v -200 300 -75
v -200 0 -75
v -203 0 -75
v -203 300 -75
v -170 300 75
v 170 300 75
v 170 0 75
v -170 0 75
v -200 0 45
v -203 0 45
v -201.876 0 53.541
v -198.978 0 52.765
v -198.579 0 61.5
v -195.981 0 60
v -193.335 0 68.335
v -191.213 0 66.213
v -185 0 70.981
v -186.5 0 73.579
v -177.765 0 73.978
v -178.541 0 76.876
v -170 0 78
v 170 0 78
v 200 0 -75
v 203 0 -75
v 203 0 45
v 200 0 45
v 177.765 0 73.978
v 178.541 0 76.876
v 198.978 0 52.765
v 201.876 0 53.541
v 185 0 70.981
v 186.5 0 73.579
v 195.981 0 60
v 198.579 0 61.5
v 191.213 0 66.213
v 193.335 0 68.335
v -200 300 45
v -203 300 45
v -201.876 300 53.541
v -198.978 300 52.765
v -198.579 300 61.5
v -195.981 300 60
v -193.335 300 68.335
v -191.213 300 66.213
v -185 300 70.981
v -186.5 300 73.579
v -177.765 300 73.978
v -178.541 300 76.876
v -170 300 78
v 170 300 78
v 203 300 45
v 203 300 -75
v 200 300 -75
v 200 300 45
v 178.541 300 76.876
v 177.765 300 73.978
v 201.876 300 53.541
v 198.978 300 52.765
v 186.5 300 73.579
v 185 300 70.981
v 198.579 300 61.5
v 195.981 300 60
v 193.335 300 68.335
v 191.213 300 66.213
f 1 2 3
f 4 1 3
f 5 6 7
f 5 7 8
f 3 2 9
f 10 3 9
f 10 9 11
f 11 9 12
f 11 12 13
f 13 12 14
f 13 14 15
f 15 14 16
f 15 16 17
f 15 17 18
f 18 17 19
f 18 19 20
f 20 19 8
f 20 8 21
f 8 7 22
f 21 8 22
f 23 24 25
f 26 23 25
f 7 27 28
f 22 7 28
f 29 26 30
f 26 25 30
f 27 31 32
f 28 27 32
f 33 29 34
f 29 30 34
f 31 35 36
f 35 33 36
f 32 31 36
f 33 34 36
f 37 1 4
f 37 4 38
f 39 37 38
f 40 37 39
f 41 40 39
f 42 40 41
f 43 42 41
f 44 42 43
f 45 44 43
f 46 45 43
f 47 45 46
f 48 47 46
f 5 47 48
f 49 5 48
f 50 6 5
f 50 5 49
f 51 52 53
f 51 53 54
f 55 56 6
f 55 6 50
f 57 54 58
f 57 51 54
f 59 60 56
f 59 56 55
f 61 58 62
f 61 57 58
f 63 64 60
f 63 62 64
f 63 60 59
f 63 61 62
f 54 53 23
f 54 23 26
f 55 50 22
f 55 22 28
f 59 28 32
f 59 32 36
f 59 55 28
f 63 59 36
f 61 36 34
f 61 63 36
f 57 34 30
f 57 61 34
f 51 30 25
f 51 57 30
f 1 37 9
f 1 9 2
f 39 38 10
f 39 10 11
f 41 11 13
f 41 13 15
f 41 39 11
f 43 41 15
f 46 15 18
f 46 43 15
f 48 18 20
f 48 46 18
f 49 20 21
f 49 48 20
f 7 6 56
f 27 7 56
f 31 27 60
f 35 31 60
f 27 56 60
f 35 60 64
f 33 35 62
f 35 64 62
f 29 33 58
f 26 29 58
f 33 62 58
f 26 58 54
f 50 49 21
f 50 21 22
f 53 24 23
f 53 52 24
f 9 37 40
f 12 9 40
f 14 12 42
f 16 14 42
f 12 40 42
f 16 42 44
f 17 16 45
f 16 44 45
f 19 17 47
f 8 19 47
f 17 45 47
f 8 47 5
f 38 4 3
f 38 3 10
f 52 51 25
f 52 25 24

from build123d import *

# Parameters (mm, degrees)
SKETCH4_W          = 722.984552569
SKETCH4_H          = 1077.767689397
CUT_EXTRUDE1_DEPTH = 3


with BuildPart() as part:
    # Sweep-Thin1: sweep along a path in Sketch3
    with BuildLine(Plane(origin=(0, 0, 0), x_dir=(0, 0, -1), z_dir=(1, 0, 0))) as sweep_thin1_path:
        Line((0, 0), (0, 300))
    # Sketch1 → Sweep-Thin1 (sweep)
    with BuildSketch(Plane(origin=(0, 0, 0), x_dir=(1, 0, 0), z_dir=(0, 1, 0))):
        with BuildLine():
            Line((-170, -78), (170, -78))
            ThreePointArc((170, -78), (193.334523779, -68.334523779), (203, -45))
            Line((203, -45), (203, 78))
            Line((203, 78), (-203, 78))
            Line((-203, 78), (-203, -45))
            ThreePointArc((-203, -45), (-193.334523779, -68.334523779), (-170, -78))
        make_face()
        with BuildLine():
            Line((-170, -75), (170, -75))
            ThreePointArc((170, -75), (191.213203436, -66.213203436), (200, -45))
            Line((200, -45), (200, 75))
            Line((200, 75), (-200, 75))
            Line((-200, 75), (-200, -45))
            ThreePointArc((-200, -45), (-191.213203436, -66.213203436), (-170, -75))
        make_face(mode=Mode.SUBTRACT)
    sweep(path=sweep_thin1_path.line)

    # Sketch4 → Cut-Extrude1 (cut)
    with BuildSketch(Plane(origin=(0, 0, -78), x_dir=(-1, 0, 0), z_dir=(0, 0, -1))):
        with Locations((86.276452511, -157.075497452)):
            Rectangle(SKETCH4_W, SKETCH4_H)
    extrude(amount=-CUT_EXTRUDE1_DEPTH, mode=Mode.SUBTRACT)


solid = part.part
